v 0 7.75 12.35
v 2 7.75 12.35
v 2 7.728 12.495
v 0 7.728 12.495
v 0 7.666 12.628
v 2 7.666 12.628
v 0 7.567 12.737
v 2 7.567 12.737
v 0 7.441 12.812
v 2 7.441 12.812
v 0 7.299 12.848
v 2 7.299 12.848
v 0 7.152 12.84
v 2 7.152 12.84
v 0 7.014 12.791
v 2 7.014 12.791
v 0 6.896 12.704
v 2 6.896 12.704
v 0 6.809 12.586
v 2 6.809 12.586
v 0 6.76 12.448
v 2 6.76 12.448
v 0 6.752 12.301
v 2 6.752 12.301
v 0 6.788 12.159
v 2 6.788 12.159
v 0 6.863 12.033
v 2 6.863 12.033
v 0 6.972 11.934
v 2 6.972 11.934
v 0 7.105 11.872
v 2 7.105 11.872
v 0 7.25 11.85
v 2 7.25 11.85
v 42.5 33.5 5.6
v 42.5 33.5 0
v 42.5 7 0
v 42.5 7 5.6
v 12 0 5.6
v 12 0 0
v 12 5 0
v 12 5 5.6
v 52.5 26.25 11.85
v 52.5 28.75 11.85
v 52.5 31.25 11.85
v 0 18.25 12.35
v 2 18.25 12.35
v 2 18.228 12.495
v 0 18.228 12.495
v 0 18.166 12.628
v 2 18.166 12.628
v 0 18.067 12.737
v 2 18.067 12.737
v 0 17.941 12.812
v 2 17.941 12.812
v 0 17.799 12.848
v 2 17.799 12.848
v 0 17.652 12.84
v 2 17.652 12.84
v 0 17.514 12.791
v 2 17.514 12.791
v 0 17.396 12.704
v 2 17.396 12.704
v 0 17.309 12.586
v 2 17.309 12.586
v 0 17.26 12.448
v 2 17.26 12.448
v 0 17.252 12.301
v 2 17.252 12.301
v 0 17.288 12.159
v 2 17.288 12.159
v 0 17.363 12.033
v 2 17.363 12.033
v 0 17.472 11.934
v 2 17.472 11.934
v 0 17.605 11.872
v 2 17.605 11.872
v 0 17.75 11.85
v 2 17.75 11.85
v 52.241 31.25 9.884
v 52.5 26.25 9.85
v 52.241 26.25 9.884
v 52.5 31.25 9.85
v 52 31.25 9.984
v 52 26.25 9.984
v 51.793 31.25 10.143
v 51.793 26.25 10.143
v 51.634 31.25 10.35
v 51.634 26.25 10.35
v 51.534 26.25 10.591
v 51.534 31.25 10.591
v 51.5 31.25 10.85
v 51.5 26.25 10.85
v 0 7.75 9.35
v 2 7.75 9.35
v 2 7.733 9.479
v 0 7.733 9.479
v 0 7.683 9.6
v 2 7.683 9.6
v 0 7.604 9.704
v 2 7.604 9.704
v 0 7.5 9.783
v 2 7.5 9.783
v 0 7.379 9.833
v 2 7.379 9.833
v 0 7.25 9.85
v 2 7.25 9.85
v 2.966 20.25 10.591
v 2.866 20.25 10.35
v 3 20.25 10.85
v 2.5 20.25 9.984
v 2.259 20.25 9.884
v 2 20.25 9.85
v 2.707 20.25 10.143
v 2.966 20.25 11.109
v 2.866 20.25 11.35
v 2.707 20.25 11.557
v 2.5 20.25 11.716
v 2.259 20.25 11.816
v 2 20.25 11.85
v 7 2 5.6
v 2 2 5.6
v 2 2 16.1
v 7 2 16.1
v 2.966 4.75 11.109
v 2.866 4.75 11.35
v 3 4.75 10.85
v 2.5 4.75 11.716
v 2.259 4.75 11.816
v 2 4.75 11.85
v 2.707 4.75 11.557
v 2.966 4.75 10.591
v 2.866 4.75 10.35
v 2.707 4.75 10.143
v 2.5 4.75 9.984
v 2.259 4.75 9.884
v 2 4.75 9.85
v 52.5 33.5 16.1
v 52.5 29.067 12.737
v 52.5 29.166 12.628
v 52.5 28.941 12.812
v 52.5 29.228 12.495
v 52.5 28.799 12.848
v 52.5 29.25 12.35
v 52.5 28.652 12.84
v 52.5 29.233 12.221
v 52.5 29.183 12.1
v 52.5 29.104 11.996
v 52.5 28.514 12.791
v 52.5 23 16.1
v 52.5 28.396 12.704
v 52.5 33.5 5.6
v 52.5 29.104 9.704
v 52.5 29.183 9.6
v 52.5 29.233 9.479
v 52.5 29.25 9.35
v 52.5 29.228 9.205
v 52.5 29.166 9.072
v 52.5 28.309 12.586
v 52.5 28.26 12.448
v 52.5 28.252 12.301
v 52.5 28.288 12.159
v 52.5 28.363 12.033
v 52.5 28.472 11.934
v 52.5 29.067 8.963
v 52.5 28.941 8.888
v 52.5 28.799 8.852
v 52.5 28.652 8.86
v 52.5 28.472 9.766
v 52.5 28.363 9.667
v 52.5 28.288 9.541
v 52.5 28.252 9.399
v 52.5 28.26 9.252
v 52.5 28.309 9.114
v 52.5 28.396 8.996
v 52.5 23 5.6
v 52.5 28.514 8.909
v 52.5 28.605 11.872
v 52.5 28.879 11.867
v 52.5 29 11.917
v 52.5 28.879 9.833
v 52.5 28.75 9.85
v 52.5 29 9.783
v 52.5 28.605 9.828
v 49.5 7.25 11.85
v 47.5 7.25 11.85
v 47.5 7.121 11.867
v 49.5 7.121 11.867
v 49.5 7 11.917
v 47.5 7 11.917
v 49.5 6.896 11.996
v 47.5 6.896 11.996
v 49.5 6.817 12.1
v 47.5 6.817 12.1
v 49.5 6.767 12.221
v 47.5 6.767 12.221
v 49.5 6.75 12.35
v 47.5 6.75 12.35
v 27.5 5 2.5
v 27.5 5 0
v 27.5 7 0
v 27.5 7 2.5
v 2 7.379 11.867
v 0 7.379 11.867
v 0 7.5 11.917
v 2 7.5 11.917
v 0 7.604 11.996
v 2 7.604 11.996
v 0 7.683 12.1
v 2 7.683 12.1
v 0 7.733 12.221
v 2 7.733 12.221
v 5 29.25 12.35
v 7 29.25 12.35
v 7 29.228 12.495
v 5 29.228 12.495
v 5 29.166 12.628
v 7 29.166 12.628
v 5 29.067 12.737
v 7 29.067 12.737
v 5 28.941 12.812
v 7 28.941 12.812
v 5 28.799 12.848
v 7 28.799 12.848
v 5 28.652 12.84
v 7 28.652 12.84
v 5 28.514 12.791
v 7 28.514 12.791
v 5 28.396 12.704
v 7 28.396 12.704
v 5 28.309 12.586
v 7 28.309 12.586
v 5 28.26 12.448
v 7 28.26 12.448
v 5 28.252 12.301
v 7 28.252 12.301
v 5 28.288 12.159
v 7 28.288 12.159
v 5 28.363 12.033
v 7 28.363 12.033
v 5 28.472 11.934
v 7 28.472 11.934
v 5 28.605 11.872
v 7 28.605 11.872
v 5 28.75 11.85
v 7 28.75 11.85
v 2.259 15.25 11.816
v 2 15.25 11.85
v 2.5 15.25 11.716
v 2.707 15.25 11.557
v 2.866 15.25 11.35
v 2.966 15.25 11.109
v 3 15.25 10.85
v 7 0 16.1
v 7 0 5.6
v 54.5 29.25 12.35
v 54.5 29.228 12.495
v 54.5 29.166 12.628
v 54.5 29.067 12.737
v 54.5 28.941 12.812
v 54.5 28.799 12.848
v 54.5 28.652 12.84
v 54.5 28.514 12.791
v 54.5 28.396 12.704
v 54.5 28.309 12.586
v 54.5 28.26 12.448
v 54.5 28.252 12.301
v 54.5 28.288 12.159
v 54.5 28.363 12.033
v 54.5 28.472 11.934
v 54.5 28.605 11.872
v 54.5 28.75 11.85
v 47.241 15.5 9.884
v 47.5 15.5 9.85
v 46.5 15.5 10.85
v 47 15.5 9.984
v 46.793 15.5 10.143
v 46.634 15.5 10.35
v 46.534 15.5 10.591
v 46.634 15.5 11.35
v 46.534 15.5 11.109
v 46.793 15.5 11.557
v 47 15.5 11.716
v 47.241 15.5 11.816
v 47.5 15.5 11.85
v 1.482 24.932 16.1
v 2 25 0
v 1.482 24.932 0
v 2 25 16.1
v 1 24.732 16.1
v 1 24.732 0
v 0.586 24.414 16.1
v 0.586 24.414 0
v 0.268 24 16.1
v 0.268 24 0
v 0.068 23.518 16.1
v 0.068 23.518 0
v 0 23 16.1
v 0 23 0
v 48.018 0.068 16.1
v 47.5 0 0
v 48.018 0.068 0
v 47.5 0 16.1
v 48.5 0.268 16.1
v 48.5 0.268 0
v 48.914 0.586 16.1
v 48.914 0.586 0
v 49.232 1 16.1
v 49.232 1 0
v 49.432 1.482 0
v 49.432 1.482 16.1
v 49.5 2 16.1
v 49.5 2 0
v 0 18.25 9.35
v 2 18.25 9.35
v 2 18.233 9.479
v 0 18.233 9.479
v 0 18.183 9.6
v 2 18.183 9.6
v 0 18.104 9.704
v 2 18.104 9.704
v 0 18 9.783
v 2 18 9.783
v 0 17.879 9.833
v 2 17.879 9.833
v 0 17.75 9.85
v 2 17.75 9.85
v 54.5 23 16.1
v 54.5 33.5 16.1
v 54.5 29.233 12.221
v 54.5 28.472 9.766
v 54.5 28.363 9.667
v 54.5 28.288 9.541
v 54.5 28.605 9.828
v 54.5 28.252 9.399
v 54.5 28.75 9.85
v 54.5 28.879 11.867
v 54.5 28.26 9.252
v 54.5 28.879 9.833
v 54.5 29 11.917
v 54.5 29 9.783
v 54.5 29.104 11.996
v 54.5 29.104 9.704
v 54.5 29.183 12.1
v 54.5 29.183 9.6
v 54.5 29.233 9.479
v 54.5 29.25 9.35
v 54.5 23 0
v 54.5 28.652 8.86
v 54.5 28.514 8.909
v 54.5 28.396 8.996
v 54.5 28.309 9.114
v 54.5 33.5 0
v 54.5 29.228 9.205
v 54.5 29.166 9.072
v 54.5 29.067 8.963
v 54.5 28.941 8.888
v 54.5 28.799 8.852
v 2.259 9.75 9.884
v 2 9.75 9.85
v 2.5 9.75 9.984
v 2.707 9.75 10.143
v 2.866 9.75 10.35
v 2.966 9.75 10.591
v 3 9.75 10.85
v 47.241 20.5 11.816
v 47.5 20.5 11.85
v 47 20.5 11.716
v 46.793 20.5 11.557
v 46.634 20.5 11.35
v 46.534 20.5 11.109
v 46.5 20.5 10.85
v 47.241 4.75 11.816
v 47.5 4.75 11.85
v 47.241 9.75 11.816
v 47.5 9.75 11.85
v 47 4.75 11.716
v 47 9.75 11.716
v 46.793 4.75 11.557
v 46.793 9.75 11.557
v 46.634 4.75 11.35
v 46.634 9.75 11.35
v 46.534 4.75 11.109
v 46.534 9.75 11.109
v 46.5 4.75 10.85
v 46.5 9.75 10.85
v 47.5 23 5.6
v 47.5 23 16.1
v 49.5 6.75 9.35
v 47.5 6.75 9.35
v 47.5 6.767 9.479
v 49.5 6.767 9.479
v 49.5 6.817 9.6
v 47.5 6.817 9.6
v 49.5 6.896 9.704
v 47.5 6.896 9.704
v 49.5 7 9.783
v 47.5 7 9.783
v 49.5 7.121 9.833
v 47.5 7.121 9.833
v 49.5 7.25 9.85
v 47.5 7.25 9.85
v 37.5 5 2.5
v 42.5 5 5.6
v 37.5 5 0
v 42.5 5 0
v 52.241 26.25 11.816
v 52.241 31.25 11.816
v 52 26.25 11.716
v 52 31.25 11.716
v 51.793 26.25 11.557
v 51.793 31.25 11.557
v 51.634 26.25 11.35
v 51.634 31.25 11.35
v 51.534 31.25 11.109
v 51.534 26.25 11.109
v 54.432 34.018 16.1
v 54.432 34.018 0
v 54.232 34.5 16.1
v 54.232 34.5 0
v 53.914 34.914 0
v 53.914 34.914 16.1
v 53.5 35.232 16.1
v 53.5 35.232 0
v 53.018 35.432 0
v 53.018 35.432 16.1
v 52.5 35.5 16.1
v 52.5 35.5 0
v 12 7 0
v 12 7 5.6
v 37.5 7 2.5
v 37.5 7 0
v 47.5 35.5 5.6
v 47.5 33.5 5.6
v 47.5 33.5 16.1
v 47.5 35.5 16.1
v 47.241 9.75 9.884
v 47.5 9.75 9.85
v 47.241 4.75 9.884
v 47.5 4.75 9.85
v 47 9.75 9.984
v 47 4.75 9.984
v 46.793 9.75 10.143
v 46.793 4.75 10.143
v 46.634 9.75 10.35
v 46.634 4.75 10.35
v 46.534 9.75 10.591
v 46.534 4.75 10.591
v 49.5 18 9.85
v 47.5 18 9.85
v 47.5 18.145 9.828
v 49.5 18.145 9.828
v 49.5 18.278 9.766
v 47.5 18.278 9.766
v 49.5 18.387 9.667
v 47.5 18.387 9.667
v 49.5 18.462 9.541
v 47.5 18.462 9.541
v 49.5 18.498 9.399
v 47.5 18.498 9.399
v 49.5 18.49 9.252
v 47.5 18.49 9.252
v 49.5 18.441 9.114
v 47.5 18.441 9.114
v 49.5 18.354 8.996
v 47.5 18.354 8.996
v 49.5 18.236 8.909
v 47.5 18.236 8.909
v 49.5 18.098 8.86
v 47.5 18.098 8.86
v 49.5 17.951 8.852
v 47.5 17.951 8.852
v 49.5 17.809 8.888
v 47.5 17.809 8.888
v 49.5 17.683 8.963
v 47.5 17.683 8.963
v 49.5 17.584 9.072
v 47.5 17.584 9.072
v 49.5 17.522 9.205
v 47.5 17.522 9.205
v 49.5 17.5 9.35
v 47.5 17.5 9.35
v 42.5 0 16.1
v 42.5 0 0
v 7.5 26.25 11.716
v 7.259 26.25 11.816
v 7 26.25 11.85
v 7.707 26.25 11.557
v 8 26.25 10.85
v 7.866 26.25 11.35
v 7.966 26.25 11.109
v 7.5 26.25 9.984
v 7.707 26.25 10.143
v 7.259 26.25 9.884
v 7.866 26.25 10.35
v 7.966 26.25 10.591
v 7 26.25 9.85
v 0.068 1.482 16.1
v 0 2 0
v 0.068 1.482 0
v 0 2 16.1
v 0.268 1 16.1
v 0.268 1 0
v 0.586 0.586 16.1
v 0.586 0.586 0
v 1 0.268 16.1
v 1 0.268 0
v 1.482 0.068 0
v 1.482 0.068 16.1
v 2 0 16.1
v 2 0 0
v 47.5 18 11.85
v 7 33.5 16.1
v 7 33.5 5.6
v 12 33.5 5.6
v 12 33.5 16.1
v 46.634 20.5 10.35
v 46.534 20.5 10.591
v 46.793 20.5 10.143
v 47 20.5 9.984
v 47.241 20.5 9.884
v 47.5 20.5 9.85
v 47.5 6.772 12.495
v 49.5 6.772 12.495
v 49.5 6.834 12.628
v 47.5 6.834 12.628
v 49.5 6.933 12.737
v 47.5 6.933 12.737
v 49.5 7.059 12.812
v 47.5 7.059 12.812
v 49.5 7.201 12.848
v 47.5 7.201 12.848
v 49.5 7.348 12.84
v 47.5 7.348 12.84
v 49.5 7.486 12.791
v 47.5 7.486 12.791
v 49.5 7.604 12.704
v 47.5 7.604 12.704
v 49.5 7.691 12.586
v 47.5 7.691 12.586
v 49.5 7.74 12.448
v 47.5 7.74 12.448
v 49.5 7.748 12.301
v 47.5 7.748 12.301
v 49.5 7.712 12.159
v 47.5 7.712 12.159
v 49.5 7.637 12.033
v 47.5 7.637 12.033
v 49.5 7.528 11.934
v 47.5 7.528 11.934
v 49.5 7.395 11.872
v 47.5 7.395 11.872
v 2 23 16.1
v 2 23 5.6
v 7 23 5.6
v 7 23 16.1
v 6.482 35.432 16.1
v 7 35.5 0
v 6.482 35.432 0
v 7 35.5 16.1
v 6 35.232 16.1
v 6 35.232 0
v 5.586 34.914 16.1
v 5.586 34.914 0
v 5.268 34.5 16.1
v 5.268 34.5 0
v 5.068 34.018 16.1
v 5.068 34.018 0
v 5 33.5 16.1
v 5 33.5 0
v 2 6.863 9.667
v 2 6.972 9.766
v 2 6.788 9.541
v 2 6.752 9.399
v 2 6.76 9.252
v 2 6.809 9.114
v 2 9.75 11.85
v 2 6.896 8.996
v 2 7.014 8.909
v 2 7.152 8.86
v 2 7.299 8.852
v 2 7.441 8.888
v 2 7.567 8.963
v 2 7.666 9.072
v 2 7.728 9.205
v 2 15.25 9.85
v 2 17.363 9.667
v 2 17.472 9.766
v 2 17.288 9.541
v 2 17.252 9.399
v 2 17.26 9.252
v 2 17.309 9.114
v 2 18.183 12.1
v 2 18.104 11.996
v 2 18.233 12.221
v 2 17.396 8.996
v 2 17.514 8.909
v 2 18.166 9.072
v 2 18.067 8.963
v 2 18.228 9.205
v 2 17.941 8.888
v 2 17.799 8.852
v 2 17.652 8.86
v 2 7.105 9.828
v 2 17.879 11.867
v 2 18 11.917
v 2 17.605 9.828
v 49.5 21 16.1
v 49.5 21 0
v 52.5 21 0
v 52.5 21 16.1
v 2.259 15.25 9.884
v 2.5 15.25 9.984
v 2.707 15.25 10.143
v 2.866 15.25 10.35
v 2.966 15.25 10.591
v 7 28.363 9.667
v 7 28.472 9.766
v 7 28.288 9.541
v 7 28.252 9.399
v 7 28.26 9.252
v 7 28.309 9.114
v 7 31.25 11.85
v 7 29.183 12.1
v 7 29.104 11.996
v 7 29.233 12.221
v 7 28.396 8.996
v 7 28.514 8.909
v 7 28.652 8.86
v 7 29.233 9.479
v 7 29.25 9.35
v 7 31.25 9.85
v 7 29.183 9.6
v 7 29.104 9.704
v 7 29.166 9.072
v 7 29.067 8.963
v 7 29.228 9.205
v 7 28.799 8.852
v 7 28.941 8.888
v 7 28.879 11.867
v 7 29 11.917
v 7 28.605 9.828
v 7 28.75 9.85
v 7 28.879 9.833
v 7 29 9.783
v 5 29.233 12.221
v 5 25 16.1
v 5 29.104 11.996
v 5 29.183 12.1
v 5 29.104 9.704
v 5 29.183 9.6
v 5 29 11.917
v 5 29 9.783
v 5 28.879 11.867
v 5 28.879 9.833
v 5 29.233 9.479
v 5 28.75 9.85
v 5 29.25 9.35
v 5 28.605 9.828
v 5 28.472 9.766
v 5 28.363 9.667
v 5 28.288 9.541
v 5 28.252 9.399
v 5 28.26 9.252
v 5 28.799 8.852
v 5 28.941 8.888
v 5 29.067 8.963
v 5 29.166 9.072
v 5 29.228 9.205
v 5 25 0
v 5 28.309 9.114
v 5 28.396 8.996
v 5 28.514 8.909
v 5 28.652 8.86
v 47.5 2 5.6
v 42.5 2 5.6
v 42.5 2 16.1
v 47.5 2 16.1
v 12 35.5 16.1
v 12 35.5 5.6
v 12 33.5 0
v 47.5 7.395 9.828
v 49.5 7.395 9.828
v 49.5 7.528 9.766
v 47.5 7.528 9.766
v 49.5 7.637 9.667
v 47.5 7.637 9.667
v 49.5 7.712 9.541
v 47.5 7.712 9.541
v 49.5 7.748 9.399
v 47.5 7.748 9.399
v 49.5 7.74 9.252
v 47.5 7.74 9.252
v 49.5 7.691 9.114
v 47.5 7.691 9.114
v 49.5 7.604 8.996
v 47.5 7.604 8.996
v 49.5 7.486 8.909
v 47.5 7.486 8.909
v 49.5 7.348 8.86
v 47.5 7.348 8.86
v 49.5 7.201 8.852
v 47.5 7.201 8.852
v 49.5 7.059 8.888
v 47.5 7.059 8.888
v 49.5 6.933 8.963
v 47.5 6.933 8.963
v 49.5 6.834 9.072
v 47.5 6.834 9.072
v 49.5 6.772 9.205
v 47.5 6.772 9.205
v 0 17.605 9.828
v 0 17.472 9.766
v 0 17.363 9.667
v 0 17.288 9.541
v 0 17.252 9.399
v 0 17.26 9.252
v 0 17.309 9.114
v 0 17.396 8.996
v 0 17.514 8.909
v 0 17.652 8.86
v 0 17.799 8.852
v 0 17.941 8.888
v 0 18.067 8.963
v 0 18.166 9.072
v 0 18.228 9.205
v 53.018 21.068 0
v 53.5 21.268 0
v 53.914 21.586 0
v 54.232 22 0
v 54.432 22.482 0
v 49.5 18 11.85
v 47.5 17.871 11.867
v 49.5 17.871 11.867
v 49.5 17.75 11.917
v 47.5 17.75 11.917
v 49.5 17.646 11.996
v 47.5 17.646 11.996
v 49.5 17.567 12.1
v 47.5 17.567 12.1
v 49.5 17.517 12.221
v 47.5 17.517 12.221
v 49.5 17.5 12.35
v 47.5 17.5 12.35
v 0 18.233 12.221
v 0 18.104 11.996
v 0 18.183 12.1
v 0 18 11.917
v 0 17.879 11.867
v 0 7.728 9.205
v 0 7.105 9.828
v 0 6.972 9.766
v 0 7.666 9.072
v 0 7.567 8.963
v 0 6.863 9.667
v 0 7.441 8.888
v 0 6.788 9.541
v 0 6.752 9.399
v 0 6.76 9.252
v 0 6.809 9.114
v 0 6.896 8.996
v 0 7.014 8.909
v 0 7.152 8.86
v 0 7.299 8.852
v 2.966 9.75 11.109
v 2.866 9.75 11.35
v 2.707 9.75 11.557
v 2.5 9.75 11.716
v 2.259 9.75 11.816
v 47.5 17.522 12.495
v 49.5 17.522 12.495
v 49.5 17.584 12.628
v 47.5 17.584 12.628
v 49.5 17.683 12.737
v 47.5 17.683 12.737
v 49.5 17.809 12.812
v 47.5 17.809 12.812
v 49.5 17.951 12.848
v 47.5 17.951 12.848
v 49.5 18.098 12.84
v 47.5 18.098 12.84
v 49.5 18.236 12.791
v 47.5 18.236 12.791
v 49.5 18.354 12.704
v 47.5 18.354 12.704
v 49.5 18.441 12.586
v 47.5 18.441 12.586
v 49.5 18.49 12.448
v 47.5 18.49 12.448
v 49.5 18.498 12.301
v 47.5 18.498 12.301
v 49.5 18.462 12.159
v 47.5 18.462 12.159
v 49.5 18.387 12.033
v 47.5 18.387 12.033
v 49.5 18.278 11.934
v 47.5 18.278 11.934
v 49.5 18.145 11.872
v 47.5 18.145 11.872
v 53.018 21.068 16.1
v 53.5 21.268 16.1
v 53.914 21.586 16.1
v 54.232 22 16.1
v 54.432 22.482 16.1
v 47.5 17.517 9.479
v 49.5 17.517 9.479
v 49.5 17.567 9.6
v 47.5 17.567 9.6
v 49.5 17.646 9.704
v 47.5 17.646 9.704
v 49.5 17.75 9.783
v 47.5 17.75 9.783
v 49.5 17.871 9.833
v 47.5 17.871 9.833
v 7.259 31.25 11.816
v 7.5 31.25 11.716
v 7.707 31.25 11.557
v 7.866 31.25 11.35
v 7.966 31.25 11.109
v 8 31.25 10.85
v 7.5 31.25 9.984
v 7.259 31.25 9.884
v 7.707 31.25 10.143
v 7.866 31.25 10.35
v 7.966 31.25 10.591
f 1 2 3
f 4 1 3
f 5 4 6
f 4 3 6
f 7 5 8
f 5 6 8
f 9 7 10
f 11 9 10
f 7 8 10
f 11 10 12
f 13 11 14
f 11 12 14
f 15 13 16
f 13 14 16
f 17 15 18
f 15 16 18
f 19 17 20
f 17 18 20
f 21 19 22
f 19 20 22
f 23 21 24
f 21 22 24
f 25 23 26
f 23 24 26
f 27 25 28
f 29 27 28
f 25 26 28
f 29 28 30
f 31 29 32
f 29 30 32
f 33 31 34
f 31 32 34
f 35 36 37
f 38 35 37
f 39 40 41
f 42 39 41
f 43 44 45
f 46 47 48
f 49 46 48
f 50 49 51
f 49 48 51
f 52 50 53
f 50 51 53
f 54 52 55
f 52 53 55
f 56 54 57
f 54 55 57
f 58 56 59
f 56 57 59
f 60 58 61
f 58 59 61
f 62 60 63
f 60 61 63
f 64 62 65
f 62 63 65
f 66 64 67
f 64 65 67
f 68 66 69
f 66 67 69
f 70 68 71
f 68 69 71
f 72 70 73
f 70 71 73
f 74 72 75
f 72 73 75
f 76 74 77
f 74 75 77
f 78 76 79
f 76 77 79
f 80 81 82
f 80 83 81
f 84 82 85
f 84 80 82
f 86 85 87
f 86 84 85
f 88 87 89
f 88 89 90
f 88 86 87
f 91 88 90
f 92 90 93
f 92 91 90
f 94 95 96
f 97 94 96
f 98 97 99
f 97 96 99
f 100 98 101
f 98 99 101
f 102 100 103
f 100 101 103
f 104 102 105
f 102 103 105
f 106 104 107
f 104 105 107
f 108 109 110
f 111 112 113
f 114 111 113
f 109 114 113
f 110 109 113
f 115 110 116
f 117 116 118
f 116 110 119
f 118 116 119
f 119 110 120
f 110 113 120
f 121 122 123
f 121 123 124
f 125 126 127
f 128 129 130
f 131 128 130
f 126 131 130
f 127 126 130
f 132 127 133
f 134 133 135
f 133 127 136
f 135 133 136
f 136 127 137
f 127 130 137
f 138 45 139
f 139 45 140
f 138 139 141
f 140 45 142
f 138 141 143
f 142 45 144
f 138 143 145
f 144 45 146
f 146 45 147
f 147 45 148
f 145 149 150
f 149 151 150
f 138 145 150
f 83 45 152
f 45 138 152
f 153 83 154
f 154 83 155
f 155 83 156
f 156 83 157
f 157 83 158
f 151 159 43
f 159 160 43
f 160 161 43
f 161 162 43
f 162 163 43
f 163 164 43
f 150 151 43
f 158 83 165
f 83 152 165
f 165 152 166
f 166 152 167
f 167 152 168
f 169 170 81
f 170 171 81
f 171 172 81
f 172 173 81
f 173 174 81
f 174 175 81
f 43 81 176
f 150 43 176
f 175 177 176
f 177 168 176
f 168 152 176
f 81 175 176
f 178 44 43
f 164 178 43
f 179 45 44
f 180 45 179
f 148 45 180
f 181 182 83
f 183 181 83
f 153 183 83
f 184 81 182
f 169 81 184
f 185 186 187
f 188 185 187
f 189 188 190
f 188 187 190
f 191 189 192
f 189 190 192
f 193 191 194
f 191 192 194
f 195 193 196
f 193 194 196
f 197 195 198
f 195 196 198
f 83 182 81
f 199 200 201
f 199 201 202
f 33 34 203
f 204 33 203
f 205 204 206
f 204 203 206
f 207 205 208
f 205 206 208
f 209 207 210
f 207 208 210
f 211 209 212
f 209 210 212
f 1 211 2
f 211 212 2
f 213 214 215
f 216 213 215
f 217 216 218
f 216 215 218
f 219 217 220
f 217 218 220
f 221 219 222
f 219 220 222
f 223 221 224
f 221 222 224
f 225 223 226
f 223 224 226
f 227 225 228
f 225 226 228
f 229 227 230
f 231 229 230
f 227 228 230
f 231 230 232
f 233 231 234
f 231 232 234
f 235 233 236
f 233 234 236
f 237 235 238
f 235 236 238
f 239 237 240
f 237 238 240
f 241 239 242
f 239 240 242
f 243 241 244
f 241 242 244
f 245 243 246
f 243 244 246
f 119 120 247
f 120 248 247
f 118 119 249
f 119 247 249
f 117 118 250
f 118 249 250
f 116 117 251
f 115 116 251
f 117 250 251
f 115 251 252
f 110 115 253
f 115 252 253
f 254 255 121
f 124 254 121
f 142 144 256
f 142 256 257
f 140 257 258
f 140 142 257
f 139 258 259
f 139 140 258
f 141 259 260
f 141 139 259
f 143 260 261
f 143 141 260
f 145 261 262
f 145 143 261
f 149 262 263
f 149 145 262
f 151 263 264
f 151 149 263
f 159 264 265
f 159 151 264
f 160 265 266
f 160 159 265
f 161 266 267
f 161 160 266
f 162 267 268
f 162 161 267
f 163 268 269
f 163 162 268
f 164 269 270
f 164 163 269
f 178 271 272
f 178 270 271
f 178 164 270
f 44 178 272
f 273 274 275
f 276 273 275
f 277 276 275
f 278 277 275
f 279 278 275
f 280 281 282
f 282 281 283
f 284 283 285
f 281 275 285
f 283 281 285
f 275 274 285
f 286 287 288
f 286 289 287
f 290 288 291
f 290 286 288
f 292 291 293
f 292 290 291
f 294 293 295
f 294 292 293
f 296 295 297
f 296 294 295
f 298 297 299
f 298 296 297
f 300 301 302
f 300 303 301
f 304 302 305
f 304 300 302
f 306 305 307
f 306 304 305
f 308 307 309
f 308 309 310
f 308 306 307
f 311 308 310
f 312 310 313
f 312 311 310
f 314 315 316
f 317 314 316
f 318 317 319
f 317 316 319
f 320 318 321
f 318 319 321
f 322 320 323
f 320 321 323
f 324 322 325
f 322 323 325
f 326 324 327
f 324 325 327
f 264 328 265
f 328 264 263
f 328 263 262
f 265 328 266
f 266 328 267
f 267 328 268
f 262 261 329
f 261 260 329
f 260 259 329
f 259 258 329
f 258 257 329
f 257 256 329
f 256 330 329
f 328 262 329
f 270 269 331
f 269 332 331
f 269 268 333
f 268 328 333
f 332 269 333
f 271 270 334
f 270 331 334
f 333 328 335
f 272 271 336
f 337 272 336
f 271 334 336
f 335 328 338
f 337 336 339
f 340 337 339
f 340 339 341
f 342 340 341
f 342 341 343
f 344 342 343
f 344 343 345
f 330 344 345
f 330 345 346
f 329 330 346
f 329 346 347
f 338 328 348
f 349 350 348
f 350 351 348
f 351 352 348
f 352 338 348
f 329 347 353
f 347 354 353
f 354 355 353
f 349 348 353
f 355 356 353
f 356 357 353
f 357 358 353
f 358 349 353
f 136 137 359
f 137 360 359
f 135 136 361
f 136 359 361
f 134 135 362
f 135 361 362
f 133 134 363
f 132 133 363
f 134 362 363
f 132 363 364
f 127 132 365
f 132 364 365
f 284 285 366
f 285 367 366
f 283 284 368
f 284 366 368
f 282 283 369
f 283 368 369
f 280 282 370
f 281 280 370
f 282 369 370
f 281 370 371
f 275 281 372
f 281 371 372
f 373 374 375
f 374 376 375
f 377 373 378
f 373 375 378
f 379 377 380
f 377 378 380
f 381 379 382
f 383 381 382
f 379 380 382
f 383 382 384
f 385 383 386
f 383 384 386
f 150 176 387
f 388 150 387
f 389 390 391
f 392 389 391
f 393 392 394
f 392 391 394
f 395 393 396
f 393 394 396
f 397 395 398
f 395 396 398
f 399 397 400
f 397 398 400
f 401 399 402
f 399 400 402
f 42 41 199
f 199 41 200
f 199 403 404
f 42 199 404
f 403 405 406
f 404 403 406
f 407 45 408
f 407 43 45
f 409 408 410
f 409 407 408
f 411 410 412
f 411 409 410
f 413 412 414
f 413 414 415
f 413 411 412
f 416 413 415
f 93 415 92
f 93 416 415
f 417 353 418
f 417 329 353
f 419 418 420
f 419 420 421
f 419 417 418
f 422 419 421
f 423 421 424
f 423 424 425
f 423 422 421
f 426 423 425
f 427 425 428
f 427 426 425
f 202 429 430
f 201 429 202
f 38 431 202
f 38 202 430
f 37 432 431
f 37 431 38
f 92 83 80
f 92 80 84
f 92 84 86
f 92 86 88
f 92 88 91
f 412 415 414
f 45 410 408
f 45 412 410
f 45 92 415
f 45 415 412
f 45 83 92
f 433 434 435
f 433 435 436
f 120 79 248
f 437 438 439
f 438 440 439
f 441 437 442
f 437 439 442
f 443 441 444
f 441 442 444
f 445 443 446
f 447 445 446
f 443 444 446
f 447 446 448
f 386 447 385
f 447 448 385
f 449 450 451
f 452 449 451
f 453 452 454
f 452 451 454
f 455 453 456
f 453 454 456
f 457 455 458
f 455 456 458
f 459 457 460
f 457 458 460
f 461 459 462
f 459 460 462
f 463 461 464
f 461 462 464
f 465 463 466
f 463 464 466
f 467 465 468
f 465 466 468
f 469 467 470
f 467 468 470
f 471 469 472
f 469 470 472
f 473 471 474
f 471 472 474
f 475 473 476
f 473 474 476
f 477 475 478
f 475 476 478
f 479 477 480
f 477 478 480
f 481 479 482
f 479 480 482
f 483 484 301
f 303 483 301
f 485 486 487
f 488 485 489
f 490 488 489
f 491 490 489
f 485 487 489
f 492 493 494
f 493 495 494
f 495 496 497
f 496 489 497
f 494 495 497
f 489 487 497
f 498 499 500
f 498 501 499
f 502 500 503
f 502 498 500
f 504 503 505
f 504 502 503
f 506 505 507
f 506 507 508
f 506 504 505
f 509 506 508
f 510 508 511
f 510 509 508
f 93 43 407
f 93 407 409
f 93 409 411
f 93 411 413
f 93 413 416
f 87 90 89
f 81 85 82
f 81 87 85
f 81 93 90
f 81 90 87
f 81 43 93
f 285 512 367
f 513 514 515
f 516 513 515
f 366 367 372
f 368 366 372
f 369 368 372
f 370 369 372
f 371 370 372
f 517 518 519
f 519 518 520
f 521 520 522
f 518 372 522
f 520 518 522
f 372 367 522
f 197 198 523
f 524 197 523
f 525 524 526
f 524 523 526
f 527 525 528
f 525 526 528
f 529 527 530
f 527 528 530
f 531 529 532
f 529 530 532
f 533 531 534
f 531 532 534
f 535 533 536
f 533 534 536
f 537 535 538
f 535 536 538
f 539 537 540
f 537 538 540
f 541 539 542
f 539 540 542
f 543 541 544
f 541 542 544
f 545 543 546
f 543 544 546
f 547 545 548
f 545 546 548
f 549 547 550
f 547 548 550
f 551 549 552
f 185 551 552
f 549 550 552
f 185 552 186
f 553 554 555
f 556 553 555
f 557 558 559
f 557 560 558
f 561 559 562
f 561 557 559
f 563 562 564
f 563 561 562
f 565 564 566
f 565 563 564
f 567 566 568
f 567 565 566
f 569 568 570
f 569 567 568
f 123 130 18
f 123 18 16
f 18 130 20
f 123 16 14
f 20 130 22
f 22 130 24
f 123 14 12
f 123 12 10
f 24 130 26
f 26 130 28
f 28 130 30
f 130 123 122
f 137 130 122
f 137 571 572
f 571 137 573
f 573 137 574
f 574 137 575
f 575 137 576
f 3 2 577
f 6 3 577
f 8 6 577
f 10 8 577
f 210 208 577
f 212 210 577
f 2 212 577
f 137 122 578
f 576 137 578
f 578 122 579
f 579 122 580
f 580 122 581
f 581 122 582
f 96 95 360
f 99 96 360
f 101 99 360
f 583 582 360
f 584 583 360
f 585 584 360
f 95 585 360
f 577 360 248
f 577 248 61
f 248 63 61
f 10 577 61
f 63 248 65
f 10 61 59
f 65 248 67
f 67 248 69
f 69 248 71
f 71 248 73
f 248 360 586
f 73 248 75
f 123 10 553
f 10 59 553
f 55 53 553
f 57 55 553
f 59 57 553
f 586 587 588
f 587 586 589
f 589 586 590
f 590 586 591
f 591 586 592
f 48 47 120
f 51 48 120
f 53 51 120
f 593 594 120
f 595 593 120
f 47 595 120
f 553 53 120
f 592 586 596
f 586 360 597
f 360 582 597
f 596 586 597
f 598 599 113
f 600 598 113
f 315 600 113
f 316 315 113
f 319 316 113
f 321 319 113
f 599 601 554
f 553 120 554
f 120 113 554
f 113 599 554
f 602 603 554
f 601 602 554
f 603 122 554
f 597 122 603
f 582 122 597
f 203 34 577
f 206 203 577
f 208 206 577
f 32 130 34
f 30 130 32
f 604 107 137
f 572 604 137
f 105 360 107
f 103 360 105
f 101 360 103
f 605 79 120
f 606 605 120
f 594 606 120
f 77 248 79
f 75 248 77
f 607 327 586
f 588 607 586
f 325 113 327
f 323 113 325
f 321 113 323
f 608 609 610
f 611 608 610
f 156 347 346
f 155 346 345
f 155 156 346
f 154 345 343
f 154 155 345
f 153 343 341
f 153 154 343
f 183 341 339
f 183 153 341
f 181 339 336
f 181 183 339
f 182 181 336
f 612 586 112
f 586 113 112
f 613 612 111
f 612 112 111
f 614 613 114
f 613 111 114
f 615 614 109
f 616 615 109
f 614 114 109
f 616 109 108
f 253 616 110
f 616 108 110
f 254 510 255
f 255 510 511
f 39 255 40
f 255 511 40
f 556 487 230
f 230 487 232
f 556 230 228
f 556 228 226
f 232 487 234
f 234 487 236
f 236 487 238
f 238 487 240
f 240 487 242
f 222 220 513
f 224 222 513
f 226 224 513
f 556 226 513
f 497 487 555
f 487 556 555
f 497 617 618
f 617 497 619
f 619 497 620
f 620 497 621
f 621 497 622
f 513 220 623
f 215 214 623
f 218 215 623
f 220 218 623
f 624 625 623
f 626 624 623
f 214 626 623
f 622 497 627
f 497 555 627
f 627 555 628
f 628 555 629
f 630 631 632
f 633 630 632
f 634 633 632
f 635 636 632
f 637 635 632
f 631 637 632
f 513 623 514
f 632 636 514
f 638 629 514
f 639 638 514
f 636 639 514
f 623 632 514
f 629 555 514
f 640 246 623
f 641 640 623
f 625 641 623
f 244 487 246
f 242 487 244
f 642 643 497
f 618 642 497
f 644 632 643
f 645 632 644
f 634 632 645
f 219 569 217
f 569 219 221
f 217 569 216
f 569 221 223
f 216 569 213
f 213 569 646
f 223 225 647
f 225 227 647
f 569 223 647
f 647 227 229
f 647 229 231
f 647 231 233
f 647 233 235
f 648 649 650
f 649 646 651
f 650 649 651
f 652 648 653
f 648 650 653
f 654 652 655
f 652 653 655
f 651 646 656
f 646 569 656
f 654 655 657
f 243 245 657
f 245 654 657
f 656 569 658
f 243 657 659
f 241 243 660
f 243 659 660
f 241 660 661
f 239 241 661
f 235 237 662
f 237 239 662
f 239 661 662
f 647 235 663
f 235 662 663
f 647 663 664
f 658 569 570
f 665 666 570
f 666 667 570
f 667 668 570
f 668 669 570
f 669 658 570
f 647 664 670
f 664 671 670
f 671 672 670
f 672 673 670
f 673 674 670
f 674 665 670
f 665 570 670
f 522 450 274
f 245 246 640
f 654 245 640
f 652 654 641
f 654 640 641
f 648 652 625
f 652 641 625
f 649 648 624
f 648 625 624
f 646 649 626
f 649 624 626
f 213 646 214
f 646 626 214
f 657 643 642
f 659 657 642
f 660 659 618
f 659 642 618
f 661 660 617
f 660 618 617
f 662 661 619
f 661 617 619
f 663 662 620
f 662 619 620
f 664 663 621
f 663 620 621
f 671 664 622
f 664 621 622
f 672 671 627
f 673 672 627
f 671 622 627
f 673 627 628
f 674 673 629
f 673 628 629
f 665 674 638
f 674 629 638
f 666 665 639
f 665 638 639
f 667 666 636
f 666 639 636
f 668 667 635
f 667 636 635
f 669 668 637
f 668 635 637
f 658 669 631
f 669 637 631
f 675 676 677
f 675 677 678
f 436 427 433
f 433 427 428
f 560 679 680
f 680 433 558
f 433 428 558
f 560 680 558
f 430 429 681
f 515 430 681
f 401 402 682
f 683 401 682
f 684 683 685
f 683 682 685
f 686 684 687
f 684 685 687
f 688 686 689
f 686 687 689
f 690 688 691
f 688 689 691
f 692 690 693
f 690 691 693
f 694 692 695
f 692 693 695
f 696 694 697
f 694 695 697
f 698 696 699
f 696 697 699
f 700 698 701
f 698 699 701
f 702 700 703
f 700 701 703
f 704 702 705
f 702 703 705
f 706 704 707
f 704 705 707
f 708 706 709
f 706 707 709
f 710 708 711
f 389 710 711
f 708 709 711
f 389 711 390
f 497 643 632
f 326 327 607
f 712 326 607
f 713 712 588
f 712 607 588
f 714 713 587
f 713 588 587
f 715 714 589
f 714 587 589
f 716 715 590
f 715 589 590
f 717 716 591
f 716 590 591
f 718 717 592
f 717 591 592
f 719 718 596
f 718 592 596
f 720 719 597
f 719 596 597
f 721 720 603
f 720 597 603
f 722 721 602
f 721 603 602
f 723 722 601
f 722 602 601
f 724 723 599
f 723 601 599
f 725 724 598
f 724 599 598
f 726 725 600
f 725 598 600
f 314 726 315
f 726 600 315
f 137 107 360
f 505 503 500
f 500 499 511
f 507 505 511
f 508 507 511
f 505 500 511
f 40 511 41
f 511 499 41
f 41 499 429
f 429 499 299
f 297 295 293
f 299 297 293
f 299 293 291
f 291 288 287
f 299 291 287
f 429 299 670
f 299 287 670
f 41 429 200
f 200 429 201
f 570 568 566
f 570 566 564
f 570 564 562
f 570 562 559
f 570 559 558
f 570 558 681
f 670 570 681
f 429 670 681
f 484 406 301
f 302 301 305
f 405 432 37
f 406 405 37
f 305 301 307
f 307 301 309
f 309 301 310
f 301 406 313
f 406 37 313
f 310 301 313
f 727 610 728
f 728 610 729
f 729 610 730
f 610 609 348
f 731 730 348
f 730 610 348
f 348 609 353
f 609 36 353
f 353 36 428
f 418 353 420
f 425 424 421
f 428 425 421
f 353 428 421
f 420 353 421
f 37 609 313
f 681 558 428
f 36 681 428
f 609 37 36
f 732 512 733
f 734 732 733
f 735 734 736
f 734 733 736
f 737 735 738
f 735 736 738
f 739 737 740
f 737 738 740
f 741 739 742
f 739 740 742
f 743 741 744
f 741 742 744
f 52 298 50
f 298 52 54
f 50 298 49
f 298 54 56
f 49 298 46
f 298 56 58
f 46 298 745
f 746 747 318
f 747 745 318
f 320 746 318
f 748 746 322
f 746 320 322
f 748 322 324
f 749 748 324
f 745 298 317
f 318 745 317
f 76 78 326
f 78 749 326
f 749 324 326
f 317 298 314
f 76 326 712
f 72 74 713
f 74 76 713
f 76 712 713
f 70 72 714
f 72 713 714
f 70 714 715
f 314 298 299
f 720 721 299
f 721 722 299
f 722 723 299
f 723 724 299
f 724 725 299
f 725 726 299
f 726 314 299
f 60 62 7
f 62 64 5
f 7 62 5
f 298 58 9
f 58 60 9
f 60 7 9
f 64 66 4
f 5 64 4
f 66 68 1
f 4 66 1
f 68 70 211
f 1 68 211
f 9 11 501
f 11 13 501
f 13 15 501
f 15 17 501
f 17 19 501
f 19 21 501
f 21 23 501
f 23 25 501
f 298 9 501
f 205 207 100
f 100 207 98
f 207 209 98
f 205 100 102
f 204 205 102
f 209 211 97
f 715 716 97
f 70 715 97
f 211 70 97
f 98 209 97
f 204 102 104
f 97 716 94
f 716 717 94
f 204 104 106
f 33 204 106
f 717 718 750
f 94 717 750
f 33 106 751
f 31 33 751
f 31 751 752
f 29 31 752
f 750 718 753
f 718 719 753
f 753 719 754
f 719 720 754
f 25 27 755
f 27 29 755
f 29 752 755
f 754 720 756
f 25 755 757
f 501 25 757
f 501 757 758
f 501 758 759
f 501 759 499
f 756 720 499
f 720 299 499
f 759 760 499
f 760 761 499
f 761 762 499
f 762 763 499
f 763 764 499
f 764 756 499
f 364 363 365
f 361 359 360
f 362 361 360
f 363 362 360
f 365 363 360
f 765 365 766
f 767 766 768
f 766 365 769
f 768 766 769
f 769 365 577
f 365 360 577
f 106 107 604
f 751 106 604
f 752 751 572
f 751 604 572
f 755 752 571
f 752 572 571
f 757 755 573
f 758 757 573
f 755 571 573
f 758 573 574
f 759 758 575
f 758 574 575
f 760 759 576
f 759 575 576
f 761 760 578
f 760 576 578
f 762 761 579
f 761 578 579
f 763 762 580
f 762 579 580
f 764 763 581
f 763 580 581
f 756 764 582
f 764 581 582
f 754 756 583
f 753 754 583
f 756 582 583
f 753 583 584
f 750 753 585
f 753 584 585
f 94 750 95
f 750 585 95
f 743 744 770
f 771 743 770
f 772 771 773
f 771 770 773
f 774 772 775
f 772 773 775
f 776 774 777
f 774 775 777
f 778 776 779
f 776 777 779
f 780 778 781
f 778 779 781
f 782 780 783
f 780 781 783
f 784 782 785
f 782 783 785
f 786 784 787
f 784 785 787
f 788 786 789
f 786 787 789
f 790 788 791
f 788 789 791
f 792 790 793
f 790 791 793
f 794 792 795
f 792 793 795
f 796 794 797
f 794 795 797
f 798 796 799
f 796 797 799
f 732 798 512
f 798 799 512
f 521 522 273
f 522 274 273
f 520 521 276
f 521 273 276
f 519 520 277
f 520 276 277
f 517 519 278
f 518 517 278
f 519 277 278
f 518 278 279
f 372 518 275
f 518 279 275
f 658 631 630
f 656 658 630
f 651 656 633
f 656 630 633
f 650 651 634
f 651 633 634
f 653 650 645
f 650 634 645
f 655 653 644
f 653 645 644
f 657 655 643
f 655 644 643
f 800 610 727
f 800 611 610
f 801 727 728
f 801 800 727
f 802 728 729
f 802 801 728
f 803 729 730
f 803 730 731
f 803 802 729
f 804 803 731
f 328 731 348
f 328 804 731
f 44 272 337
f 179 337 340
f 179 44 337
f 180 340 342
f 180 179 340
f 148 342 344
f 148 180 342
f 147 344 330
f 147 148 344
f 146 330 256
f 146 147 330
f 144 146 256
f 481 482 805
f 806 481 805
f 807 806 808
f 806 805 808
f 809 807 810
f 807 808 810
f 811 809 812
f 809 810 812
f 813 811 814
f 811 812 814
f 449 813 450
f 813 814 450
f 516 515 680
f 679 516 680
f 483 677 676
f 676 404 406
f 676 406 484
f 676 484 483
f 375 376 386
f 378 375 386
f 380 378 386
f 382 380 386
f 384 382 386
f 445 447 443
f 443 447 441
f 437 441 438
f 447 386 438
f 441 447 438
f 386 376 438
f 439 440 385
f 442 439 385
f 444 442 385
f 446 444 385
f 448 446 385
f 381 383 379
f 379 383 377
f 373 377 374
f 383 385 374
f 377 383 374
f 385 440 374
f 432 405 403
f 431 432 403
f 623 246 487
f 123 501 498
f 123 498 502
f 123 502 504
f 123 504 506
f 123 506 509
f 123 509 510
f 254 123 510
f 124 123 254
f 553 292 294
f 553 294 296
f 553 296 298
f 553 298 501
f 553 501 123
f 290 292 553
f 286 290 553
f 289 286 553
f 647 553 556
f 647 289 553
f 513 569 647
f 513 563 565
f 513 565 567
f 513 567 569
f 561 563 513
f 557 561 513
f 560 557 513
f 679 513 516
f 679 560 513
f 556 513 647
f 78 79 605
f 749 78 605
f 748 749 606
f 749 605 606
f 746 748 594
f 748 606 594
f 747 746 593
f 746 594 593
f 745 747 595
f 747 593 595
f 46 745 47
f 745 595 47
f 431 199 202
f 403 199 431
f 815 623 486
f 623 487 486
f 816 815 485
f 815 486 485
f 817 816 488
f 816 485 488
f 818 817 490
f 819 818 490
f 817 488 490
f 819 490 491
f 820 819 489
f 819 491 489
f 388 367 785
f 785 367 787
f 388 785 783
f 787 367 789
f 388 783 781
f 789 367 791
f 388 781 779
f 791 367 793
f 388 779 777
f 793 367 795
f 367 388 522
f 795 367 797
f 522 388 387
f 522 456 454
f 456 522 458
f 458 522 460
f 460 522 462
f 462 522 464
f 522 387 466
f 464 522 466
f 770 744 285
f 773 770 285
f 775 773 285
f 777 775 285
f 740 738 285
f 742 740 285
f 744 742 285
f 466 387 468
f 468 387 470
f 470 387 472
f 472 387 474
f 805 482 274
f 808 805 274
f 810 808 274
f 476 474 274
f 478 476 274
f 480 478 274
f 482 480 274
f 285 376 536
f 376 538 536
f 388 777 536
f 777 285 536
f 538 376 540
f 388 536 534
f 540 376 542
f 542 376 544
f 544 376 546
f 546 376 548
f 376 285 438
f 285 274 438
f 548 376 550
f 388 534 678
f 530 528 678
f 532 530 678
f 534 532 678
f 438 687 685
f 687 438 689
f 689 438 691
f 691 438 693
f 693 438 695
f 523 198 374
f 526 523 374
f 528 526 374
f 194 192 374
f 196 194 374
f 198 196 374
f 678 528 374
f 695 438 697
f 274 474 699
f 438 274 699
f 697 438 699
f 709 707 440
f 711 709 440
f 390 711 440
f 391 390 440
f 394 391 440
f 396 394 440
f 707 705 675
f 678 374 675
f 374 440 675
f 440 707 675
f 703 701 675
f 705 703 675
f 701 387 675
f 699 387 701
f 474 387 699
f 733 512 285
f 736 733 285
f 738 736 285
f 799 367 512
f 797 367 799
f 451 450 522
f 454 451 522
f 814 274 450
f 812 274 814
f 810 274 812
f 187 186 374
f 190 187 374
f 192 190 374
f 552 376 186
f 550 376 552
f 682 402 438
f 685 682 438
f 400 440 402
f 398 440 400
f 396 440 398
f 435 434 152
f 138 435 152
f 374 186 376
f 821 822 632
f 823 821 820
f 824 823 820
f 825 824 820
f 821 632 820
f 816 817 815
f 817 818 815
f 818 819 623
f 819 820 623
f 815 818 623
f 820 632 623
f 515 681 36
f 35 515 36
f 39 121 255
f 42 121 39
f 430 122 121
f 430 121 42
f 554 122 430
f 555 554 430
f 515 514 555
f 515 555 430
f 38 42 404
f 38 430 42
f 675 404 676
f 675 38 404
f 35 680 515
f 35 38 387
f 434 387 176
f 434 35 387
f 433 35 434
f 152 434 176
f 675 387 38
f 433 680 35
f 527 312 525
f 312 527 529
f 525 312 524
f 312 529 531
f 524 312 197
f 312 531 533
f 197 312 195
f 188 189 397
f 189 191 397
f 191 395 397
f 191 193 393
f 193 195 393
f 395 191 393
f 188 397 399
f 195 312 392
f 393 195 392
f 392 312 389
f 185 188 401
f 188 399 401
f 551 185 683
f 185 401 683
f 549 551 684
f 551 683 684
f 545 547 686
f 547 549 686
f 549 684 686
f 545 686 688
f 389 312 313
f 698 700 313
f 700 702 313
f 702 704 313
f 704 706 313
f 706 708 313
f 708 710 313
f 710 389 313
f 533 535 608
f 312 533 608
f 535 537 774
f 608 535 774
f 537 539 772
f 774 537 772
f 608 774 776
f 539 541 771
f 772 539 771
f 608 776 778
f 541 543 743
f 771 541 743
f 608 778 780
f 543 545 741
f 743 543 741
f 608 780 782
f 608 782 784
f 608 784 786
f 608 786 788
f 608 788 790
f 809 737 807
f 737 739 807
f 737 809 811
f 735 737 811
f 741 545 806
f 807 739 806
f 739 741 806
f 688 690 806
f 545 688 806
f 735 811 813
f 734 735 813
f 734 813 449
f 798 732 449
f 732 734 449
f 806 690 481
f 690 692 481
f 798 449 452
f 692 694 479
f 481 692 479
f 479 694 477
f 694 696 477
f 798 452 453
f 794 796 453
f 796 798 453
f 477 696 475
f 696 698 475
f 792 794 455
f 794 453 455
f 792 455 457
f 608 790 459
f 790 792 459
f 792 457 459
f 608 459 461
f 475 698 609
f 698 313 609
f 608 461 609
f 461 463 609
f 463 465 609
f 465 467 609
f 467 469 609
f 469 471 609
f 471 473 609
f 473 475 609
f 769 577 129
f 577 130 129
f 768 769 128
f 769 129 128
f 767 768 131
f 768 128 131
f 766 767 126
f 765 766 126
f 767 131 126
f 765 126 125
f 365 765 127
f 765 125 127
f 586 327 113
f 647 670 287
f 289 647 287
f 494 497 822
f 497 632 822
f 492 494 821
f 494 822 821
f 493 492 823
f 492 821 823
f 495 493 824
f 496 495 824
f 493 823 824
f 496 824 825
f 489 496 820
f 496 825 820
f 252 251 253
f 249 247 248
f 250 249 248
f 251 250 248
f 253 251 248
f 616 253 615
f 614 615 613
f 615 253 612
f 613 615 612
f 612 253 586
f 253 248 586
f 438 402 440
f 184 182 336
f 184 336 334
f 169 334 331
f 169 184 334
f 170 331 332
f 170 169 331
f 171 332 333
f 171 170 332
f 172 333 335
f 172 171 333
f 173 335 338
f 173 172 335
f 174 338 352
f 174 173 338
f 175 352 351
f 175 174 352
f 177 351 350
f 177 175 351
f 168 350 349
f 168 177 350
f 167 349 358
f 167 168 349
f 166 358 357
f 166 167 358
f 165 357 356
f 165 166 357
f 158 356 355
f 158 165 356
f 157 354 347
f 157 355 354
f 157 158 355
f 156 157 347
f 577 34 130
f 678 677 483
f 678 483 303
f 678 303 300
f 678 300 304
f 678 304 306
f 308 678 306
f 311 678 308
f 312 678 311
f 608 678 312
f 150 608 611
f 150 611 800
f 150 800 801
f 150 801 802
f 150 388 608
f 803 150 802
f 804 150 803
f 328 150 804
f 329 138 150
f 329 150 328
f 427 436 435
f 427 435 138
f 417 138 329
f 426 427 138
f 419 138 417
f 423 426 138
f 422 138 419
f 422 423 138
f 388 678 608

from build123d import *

# Parameters (mm, degrees)
F0_W      = 2
F0_H      = 10.5
F0_H_2    = 2
F0_W_2    = 5
F1_DEPTH  = 16.1
F0_H_3    = 21
F0_W_3    = 30.5
F2_DEPTH  = 5.6
F3_DEPTH  = 5.6
F4_R      = 2
F22_DEPTH = 1
F23_DEPTH = 25
F24_DEPTH = 1
F25_DEPTH = 25
F26_R     = 0.99999
F27_W     = 10
F27_H     = 2.5
F28_DEPTH = 15


# Not quite as in the source:
# - a fillet or chamfer is up to 0.001 mm smaller than in the source, because OpenCascade refuses the exact size


with BuildPart() as f1:
    # F0 (on Top) → F1 (new body)
    with BuildSketch(Plane.XY):
        with Locations((53.5, 28.25)):
            Rectangle(F0_W, F0_H)
        with Locations((53.5, 34.5)):
            Rectangle(F0_W, F0_H_2)
        Polygon((52.5, 23), (49.5, 23), (49.5, 21), (54.5, 21), (54.5, 23), align=None)
        Polygon((47.5, 23), (47.5, 2), (49.5, 2), (49.5, 21), (49.5, 23), align=None)
        with Locations((48.5, 1)):
            Rectangle(F0_W, F0_H_2)
        with Locations((45, 1)):
            Rectangle(F0_W_2, F0_H_2)
        with Locations((50, 34.5)):
            Rectangle(F0_W_2, F0_H_2)
    extrude(amount=F1_DEPTH)



with BuildPart() as f1b:
    # F0 (on Top) → F1, piece 2 (new body)
    with BuildSketch(Plane.XY):
        with Locations((6, 34.5)):
            Rectangle(F0_W, F0_H_2)
        Polygon((5, 25), (5, 23), (7, 23), (7, 33.5), (5, 33.5), align=None)
        Polygon((0, 25), (0, 23), (2, 23), (5, 23), (5, 25), align=None)
        with Locations((1, 12.5)):
            Rectangle(F0_W, F0_H_3)
        with Locations((1, 1)):
            Rectangle(F0_W, F0_H_2)
        with Locations((4.5, 1)):
            Rectangle(F0_W_2, F0_H_2)
        with Locations((9.5, 34.5)):
            Rectangle(F0_W_2, F0_H_2)
    extrude(amount=F1_DEPTH)


with BuildPart() as f1_1:
    add(f1.part)

    add(f1b.part)  # F2 merges F1b
    # F0 (on Top) → F2 (join)
    with BuildSketch(Plane.XY):
        with Locations((27.25, 34.5)):
            Rectangle(F0_W_3, F0_H_2)
        with Locations((45, 34.5)):
            Rectangle(F0_W_2, F0_H_2)
        with Locations((9.5, 1)):
            Rectangle(F0_W_2, F0_H_2)
        Polygon((2, 23), (2, 2), (7, 2), (7, 23), (5, 23), align=None)
        Polygon((7, 23), (7, 2), (12, 2), (12, 5), (12, 7), (12, 23), align=None)
        with Locations((9.5, 28.25)):
            Rectangle(F0_W_2, F0_H)
        Polygon((42.5, 33.5), (42.5, 23), (47.5, 23), (49.5, 23), (52.5, 23), (52.5, 33.5), (47.5, 33.5), align=None)
        Polygon((42.5, 5), (42.5, 2), (47.5, 2), (47.5, 23), (42.5, 23), (42.5, 7), align=None)
    extrude(amount=F2_DEPTH)

    # F0 (on Top) → F3 (join)
    with BuildSketch(Plane.XY):
        with Locations((27.25, 6)):
            Rectangle(F0_W_3, F0_H_2)
    extrude(amount=F3_DEPTH)

    # F4
    f4_edges = [f1_1.edges().sort_by_distance(p)[0] for p in [
        (0, 0, 8.05),
        (0, 25, 8.05),
        (5, 35.5, 8.05),
        (54.5, 35.5, 8.05),
        (54.5, 21, 8.05),
        (49.5, 0, 8.05),
    ]]
    fillet(f4_edges, radius=F4_R)

    # F18 (on 3pt) + F19 (on 3pt) → F22 (join)
    with BuildSketch(Plane.YZ.offset(2)):
        Polygon((4.75, 11.85), (4.75, 9.85), (7.25, 9.85), (9.75, 9.85), (9.75, 11.85), (7.25, 11.85), align=None)
        Polygon((15.25, 11.85), (15.25, 9.85), (17.75, 9.85), (20.25, 9.85), (20.25, 11.85), (17.75, 11.85), align=None)
    with BuildSketch(Plane.YZ.offset(7)):
        Polygon((26.25, 11.85), (26.25, 9.85), (28.75, 9.85), (31.25, 9.85), (31.25, 11.85), (28.75, 11.85), align=None)
    extrude(amount=F22_DEPTH)

    # F18 (on 3pt) + F19 (on 3pt) → F23 (cut)
    with BuildSketch(Plane.YZ.offset(2)):
        with BuildLine():
            ThreePointArc((18.25, 12.35), (17.3964466094, 12.7035533906), (17.75, 11.85))
            ThreePointArc((17.75, 11.85), (18.1035533906, 11.9964466094), (18.25, 12.35))
        make_face()
        with BuildLine():
            ThreePointArc((18.25, 9.35), (18.1035533906, 9.7035533906), (17.75, 9.85))
            ThreePointArc((17.75, 9.85), (17.3964466094, 8.9964466094), (18.25, 9.35))
        make_face()
        with BuildLine():
            ThreePointArc((7.75, 9.35), (7.6035533906, 9.7035533906), (7.25, 9.85))
            ThreePointArc((7.25, 9.85), (6.8964466094, 8.9964466094), (7.75, 9.35))
        make_face()
        with BuildLine():
            ThreePointArc((7.75, 12.35), (6.8964466094, 12.7035533906), (7.25, 11.85))
            ThreePointArc((7.25, 11.85), (7.6035533906, 11.9964466094), (7.75, 12.35))
        make_face()
    with BuildSketch(Plane.YZ.offset(7)):
        with BuildLine():
            ThreePointArc((29.25, 12.35), (28.3964466094, 12.7035533906), (28.75, 11.85))
            ThreePointArc((28.75, 11.85), (29.1035533906, 11.9964466094), (29.25, 12.35))
        make_face()
        with BuildLine():
            ThreePointArc((29.25, 9.35), (29.1035533906, 9.7035533906), (28.75, 9.85))
            ThreePointArc((28.75, 9.85), (28.3964466094, 8.9964466094), (29.25, 9.35))
        make_face()
    extrude(amount=-F23_DEPTH, mode=Mode.SUBTRACT)

    # F20 (on 3pt) + F21 (on 3pt) → F24 (join)
    with BuildSketch(Plane(origin=(47.5, 0, 0), x_dir=(0, -1, 0), z_dir=(-1, 0, 0))):
        Polygon((-20.5, 11.85), (-20.5, 9.85), (-18, 9.85), (-15.5, 9.85), (-15.5, 11.85), (-18, 11.85), align=None)
        Polygon((-9.75, 11.85), (-9.75, 9.85), (-7.25, 9.85), (-4.75, 9.85), (-4.75, 11.85), (-7.25, 11.85), align=None)
    with BuildSketch(Plane.YZ.offset(52.5)):
        Polygon((26.25, 11.85), (26.25, 9.85), (28.75, 9.85), (31.25, 9.85), (31.25, 11.85), (28.75, 11.85), align=None)
    extrude(amount=F24_DEPTH, dir=(-1, 0, 0))

    # F21 (on 3pt) + F20 (on 3pt) → F25 (cut)
    with BuildSketch(Plane.YZ.offset(52.5)):
        with BuildLine():
            ThreePointArc((29.25, 12.35), (28.3964466094, 12.7035533906), (28.75, 11.85))
            ThreePointArc((28.75, 11.85), (29.1035533906, 11.9964466094), (29.25, 12.35))
        make_face()
        with BuildLine():
            ThreePointArc((29.25, 9.35), (29.1035533906, 9.7035533906), (28.75, 9.85))
            ThreePointArc((28.75, 9.85), (28.3964466094, 8.9964466094), (29.25, 9.35))
        make_face()
    with BuildSketch(Plane(origin=(47.5, 0, 0), x_dir=(0, -1, 0), z_dir=(-1, 0, 0))):
        with BuildLine():
            ThreePointArc((-17.5, 12.35), (-18.3535533906, 12.7035533906), (-18, 11.85))
            ThreePointArc((-18, 11.85), (-17.6464466094, 11.9964466094), (-17.5, 12.35))
        make_face()
        with BuildLine():
            ThreePointArc((-17.5, 9.35), (-17.6464466094, 9.7035533906), (-18, 9.85))
            ThreePointArc((-18, 9.85), (-18.3535533906, 8.9964466094), (-17.5, 9.35))
        make_face()
        with BuildLine():
            ThreePointArc((-6.75, 12.35), (-7.6035533906, 12.7035533906), (-7.25, 11.85))
            ThreePointArc((-7.25, 11.85), (-6.8964466094, 11.9964466094), (-6.75, 12.35))
        make_face()
        with BuildLine():
            ThreePointArc((-6.75, 9.35), (-6.8964466094, 9.7035533906), (-7.25, 9.85))
            ThreePointArc((-7.25, 9.85), (-7.6035533906, 8.9964466094), (-6.75, 9.35))
        make_face()
    extrude(amount=F25_DEPTH, dir=(1, 0, 0), mode=Mode.SUBTRACT)

    # F26 (radius 1 in the source; OpenCascade refuses exactly that, so slightly less here)
    f26_edges = [f1_1.edges().sort_by_distance(p)[0] for p in [
        (3, 7.25, 11.85),
        (3, 7.25, 9.85),
        (3, 17.75, 11.85),
        (3, 17.75, 9.85),
        (8, 28.75, 11.85),
        (8, 28.75, 9.85),
        (46.5, 18, 9.85),
        (46.5, 7.25, 9.85),
        (46.5, 7.25, 11.85),
        (46.5, 18, 11.85),
        (51.5, 28.75, 11.85),
        (51.5, 28.75, 9.85),
    ]]
    fillet(f26_edges, radius=F26_R)

    # F27 (on face) → F28 (cut)
    with BuildSketch(Plane.XZ.offset(-5)):
        with Locations((32.5, 1.25)):
            Rectangle(F27_W, F27_H)
    extrude(amount=-F28_DEPTH, mode=Mode.SUBTRACT)


solid = f1_1.part
